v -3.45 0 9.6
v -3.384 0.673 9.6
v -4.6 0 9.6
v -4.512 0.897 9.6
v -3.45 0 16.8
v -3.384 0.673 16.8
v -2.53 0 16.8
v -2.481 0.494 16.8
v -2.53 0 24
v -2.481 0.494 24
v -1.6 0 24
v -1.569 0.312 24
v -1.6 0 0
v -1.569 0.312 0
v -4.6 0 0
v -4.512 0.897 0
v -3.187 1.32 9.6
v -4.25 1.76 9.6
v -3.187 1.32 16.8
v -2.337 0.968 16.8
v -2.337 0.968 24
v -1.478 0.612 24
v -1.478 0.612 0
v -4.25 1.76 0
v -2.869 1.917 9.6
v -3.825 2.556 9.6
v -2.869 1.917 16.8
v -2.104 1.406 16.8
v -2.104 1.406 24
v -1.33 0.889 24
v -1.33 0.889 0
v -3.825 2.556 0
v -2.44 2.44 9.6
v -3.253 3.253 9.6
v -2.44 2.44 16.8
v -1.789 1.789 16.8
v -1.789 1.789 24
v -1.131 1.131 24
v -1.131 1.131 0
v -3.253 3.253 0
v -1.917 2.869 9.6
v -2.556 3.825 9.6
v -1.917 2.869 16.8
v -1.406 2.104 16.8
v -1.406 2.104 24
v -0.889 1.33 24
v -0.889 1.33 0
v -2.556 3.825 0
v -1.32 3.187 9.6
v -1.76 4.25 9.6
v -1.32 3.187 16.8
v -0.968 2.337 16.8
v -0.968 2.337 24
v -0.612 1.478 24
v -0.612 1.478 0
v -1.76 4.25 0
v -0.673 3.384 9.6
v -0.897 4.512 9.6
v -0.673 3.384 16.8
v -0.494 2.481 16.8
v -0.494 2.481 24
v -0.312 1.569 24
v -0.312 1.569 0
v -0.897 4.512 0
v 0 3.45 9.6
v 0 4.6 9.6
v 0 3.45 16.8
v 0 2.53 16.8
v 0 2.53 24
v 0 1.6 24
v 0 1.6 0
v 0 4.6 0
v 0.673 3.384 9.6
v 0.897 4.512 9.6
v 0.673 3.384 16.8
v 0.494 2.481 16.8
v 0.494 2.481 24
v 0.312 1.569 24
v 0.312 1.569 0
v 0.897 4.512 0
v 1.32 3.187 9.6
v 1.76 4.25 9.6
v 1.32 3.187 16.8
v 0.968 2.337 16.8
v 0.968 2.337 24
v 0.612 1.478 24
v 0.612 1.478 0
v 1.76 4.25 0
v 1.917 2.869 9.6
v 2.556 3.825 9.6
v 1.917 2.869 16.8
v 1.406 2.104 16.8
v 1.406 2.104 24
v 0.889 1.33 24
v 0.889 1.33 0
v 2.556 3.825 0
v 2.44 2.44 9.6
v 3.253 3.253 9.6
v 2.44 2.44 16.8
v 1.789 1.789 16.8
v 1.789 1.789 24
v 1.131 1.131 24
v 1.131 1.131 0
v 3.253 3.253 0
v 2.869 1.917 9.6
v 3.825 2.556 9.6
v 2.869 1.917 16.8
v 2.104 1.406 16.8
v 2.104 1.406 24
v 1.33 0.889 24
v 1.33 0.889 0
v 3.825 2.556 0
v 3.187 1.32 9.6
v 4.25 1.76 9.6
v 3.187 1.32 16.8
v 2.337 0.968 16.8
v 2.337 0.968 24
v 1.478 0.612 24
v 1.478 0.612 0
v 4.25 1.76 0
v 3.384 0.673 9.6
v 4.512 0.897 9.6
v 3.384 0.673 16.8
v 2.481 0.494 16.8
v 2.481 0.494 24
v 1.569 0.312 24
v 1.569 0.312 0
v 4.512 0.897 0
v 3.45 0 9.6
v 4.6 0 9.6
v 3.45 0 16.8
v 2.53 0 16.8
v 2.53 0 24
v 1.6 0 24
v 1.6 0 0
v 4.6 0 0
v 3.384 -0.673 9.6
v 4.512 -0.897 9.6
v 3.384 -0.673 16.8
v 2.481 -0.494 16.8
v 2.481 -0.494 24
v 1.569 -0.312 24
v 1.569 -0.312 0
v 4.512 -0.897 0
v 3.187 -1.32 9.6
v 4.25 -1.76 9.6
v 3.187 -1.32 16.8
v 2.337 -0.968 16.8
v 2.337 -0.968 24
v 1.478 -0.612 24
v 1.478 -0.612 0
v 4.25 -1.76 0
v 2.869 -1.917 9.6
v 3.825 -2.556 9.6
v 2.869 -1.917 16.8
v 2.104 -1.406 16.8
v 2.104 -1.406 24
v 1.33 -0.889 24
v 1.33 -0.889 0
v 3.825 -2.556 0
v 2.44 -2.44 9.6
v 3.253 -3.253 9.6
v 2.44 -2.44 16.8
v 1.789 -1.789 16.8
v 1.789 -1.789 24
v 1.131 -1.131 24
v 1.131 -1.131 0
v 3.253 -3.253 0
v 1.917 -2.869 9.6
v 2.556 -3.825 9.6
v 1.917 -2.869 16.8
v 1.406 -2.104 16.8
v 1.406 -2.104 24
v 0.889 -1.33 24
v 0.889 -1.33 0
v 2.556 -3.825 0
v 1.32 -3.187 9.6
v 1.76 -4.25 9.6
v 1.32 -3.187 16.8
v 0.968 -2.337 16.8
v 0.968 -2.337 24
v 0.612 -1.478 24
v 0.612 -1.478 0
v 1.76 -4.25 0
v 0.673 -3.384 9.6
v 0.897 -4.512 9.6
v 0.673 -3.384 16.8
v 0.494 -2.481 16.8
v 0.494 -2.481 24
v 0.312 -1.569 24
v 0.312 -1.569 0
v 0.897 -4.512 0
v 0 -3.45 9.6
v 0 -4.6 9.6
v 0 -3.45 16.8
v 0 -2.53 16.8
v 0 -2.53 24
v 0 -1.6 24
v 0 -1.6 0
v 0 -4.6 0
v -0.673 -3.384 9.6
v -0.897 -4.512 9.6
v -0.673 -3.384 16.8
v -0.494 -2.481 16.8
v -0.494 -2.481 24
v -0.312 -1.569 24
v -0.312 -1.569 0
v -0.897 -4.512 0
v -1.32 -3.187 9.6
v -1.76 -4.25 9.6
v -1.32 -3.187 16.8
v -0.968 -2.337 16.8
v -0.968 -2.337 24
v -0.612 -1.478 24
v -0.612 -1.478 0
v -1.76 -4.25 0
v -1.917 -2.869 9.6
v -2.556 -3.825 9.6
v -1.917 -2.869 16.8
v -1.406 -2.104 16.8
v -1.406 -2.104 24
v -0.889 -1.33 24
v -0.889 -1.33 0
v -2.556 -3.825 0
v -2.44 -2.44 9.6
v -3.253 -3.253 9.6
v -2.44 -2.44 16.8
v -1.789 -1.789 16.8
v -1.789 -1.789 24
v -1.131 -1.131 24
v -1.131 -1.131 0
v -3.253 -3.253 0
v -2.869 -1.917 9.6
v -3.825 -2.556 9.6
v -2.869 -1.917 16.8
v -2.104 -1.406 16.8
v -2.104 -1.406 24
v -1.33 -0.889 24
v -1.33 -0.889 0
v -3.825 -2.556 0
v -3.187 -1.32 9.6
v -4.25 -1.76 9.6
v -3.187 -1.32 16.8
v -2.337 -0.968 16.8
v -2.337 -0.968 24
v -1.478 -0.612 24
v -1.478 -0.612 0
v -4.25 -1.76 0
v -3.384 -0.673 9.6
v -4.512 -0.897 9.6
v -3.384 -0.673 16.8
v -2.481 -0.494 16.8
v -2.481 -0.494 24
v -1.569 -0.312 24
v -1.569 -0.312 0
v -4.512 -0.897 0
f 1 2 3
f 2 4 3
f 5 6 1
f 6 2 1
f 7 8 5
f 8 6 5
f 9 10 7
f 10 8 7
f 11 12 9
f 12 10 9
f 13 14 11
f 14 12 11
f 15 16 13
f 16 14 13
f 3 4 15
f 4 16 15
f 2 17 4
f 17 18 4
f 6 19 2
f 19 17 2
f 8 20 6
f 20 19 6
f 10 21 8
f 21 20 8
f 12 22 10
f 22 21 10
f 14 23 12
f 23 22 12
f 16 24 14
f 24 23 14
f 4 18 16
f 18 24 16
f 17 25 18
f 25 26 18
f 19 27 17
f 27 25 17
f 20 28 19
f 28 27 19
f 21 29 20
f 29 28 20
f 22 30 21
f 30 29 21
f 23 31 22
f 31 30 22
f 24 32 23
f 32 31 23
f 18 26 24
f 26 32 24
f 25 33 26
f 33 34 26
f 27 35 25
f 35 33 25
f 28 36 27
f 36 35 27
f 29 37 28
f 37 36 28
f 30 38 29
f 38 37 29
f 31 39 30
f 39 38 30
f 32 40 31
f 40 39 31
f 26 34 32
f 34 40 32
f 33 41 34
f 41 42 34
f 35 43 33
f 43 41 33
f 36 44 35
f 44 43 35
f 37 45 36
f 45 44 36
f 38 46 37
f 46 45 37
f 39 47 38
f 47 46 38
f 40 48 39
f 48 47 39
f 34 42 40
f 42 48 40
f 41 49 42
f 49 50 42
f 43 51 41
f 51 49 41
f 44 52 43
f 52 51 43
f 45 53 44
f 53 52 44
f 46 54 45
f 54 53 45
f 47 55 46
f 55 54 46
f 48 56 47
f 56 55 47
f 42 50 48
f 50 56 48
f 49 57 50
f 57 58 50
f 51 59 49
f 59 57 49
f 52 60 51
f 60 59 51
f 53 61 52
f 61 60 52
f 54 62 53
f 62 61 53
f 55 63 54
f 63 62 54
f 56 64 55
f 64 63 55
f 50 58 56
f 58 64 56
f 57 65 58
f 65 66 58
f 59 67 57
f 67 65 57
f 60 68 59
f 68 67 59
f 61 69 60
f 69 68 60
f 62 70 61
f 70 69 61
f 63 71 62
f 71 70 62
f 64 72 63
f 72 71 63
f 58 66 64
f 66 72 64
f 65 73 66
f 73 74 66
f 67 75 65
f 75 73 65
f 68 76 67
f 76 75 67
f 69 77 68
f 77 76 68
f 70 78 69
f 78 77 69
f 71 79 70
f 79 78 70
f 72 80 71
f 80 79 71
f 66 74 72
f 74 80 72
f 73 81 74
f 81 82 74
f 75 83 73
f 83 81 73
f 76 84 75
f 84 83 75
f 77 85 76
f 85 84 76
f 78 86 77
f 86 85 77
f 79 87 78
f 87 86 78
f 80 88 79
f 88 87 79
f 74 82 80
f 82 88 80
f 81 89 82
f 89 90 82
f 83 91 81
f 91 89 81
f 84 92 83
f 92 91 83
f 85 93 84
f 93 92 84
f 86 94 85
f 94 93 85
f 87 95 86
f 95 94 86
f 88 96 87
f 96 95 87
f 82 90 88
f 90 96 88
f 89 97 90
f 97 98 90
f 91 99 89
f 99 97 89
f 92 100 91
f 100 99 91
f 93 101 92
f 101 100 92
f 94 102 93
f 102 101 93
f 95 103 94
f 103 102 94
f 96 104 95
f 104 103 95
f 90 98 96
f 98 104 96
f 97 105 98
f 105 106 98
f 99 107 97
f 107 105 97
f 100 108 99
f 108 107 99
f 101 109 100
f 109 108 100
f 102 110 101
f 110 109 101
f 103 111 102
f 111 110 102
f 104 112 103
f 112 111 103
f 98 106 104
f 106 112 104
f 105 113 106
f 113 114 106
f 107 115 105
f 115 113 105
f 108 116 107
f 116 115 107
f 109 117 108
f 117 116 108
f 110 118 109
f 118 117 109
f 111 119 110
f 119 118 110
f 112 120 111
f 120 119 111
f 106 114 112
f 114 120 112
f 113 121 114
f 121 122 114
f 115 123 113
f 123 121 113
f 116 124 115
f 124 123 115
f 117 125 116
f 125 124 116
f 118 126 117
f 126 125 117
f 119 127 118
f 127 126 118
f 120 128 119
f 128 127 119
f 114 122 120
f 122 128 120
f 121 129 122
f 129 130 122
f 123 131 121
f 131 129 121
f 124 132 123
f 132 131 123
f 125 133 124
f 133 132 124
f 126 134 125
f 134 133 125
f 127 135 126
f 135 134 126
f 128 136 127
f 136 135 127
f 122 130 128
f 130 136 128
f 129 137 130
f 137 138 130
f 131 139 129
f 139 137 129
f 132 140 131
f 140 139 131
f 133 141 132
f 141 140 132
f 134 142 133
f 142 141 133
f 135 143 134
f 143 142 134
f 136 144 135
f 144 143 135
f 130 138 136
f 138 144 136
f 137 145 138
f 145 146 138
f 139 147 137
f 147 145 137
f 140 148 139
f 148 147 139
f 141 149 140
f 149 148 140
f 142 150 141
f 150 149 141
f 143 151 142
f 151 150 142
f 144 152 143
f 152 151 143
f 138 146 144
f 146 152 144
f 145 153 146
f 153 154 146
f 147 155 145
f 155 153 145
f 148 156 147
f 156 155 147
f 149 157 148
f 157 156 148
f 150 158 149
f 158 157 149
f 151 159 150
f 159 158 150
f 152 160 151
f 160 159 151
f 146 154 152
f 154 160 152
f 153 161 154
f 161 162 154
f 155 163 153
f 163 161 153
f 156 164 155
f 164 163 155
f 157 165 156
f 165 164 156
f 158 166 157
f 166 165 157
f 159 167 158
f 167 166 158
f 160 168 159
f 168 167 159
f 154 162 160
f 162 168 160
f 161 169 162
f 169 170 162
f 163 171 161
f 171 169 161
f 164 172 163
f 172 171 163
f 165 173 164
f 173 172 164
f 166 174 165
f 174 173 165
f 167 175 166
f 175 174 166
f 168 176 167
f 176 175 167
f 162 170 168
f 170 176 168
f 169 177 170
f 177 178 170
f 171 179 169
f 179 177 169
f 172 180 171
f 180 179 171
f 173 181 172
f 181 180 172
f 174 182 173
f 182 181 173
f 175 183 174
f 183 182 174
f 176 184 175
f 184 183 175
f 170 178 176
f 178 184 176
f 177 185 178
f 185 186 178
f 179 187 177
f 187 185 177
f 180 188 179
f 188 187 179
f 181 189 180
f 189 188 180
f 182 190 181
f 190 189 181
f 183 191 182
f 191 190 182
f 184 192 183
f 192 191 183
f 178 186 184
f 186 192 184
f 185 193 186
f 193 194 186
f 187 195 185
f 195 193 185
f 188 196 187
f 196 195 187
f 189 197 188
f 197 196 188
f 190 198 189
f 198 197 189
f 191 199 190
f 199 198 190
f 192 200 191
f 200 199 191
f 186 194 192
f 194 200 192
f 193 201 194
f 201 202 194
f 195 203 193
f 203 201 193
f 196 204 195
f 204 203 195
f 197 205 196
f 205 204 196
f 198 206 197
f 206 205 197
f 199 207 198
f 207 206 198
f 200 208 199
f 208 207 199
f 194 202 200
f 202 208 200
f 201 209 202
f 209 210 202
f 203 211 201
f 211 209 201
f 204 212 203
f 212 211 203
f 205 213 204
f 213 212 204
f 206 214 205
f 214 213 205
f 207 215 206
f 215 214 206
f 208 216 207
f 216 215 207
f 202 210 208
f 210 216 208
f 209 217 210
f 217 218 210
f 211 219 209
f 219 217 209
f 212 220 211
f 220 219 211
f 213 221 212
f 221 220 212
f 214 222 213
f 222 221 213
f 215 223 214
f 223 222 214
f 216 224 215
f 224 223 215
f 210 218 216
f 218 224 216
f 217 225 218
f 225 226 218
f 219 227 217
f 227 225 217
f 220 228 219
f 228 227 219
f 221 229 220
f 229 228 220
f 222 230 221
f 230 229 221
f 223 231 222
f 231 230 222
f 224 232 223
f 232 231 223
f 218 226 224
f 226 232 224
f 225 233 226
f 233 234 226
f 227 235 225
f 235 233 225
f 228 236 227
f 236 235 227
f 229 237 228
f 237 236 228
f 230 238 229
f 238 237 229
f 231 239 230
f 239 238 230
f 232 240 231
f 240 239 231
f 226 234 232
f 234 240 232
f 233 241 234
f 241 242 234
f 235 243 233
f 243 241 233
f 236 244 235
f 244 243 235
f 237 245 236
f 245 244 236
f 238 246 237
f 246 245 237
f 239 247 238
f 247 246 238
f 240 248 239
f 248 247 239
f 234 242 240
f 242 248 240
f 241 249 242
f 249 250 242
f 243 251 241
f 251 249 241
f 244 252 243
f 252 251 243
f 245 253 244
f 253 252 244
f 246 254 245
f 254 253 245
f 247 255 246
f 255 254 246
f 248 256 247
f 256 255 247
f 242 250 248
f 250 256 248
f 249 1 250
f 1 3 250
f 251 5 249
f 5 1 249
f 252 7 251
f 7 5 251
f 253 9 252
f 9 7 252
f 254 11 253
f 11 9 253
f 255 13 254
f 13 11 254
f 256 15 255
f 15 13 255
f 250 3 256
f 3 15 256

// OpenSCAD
$fn = 32;

// ----------------------------------------------------------------------
// Profiled standoff: stepped spacer, 24 mm long, bore 3.2 mm
// ----------------------------------------------------------------------

// --- parameters (mm) ---
revolve_angle = 360;      // full turn around the Z axis
profile_points = 8;       // points of the closed outline

profile = [[1.6, 0], [4.6, 0], [4.6, 9.6], [3.45, 9.6], [3.45, 16.8], [2.53, 16.8], [2.53, 24], [1.6, 24]];  // single closed polygon, 8 points, counter clockwise

// --- the one profile operation ---
rotate_extrude(angle = revolve_angle) polygon(points = profile);
